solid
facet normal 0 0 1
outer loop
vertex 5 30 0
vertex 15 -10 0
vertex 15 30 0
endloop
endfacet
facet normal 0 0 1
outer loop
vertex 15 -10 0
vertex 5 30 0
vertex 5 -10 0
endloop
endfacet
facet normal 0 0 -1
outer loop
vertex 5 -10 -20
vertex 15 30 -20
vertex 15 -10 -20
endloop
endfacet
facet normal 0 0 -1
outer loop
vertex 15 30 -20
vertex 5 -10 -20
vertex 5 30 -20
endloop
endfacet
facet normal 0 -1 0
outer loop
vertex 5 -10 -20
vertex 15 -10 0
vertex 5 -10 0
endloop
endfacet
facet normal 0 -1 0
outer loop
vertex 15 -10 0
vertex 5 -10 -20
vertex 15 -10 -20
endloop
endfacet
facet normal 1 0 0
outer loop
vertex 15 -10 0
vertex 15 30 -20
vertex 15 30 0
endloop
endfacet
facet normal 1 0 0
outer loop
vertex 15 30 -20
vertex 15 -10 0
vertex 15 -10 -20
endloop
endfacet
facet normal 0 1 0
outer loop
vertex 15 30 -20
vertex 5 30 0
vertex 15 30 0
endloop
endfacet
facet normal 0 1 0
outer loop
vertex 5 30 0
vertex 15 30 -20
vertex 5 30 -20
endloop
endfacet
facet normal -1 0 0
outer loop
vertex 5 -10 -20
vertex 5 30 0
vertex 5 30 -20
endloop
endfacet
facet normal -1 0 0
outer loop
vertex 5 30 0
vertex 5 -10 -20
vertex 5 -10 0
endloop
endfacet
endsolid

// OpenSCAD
translate(v=[10, 10, -10]){
    translate(v=[-5.0, -20.0, -10.0]){
        cube(size=[10, 40, 20]);
    };
};
